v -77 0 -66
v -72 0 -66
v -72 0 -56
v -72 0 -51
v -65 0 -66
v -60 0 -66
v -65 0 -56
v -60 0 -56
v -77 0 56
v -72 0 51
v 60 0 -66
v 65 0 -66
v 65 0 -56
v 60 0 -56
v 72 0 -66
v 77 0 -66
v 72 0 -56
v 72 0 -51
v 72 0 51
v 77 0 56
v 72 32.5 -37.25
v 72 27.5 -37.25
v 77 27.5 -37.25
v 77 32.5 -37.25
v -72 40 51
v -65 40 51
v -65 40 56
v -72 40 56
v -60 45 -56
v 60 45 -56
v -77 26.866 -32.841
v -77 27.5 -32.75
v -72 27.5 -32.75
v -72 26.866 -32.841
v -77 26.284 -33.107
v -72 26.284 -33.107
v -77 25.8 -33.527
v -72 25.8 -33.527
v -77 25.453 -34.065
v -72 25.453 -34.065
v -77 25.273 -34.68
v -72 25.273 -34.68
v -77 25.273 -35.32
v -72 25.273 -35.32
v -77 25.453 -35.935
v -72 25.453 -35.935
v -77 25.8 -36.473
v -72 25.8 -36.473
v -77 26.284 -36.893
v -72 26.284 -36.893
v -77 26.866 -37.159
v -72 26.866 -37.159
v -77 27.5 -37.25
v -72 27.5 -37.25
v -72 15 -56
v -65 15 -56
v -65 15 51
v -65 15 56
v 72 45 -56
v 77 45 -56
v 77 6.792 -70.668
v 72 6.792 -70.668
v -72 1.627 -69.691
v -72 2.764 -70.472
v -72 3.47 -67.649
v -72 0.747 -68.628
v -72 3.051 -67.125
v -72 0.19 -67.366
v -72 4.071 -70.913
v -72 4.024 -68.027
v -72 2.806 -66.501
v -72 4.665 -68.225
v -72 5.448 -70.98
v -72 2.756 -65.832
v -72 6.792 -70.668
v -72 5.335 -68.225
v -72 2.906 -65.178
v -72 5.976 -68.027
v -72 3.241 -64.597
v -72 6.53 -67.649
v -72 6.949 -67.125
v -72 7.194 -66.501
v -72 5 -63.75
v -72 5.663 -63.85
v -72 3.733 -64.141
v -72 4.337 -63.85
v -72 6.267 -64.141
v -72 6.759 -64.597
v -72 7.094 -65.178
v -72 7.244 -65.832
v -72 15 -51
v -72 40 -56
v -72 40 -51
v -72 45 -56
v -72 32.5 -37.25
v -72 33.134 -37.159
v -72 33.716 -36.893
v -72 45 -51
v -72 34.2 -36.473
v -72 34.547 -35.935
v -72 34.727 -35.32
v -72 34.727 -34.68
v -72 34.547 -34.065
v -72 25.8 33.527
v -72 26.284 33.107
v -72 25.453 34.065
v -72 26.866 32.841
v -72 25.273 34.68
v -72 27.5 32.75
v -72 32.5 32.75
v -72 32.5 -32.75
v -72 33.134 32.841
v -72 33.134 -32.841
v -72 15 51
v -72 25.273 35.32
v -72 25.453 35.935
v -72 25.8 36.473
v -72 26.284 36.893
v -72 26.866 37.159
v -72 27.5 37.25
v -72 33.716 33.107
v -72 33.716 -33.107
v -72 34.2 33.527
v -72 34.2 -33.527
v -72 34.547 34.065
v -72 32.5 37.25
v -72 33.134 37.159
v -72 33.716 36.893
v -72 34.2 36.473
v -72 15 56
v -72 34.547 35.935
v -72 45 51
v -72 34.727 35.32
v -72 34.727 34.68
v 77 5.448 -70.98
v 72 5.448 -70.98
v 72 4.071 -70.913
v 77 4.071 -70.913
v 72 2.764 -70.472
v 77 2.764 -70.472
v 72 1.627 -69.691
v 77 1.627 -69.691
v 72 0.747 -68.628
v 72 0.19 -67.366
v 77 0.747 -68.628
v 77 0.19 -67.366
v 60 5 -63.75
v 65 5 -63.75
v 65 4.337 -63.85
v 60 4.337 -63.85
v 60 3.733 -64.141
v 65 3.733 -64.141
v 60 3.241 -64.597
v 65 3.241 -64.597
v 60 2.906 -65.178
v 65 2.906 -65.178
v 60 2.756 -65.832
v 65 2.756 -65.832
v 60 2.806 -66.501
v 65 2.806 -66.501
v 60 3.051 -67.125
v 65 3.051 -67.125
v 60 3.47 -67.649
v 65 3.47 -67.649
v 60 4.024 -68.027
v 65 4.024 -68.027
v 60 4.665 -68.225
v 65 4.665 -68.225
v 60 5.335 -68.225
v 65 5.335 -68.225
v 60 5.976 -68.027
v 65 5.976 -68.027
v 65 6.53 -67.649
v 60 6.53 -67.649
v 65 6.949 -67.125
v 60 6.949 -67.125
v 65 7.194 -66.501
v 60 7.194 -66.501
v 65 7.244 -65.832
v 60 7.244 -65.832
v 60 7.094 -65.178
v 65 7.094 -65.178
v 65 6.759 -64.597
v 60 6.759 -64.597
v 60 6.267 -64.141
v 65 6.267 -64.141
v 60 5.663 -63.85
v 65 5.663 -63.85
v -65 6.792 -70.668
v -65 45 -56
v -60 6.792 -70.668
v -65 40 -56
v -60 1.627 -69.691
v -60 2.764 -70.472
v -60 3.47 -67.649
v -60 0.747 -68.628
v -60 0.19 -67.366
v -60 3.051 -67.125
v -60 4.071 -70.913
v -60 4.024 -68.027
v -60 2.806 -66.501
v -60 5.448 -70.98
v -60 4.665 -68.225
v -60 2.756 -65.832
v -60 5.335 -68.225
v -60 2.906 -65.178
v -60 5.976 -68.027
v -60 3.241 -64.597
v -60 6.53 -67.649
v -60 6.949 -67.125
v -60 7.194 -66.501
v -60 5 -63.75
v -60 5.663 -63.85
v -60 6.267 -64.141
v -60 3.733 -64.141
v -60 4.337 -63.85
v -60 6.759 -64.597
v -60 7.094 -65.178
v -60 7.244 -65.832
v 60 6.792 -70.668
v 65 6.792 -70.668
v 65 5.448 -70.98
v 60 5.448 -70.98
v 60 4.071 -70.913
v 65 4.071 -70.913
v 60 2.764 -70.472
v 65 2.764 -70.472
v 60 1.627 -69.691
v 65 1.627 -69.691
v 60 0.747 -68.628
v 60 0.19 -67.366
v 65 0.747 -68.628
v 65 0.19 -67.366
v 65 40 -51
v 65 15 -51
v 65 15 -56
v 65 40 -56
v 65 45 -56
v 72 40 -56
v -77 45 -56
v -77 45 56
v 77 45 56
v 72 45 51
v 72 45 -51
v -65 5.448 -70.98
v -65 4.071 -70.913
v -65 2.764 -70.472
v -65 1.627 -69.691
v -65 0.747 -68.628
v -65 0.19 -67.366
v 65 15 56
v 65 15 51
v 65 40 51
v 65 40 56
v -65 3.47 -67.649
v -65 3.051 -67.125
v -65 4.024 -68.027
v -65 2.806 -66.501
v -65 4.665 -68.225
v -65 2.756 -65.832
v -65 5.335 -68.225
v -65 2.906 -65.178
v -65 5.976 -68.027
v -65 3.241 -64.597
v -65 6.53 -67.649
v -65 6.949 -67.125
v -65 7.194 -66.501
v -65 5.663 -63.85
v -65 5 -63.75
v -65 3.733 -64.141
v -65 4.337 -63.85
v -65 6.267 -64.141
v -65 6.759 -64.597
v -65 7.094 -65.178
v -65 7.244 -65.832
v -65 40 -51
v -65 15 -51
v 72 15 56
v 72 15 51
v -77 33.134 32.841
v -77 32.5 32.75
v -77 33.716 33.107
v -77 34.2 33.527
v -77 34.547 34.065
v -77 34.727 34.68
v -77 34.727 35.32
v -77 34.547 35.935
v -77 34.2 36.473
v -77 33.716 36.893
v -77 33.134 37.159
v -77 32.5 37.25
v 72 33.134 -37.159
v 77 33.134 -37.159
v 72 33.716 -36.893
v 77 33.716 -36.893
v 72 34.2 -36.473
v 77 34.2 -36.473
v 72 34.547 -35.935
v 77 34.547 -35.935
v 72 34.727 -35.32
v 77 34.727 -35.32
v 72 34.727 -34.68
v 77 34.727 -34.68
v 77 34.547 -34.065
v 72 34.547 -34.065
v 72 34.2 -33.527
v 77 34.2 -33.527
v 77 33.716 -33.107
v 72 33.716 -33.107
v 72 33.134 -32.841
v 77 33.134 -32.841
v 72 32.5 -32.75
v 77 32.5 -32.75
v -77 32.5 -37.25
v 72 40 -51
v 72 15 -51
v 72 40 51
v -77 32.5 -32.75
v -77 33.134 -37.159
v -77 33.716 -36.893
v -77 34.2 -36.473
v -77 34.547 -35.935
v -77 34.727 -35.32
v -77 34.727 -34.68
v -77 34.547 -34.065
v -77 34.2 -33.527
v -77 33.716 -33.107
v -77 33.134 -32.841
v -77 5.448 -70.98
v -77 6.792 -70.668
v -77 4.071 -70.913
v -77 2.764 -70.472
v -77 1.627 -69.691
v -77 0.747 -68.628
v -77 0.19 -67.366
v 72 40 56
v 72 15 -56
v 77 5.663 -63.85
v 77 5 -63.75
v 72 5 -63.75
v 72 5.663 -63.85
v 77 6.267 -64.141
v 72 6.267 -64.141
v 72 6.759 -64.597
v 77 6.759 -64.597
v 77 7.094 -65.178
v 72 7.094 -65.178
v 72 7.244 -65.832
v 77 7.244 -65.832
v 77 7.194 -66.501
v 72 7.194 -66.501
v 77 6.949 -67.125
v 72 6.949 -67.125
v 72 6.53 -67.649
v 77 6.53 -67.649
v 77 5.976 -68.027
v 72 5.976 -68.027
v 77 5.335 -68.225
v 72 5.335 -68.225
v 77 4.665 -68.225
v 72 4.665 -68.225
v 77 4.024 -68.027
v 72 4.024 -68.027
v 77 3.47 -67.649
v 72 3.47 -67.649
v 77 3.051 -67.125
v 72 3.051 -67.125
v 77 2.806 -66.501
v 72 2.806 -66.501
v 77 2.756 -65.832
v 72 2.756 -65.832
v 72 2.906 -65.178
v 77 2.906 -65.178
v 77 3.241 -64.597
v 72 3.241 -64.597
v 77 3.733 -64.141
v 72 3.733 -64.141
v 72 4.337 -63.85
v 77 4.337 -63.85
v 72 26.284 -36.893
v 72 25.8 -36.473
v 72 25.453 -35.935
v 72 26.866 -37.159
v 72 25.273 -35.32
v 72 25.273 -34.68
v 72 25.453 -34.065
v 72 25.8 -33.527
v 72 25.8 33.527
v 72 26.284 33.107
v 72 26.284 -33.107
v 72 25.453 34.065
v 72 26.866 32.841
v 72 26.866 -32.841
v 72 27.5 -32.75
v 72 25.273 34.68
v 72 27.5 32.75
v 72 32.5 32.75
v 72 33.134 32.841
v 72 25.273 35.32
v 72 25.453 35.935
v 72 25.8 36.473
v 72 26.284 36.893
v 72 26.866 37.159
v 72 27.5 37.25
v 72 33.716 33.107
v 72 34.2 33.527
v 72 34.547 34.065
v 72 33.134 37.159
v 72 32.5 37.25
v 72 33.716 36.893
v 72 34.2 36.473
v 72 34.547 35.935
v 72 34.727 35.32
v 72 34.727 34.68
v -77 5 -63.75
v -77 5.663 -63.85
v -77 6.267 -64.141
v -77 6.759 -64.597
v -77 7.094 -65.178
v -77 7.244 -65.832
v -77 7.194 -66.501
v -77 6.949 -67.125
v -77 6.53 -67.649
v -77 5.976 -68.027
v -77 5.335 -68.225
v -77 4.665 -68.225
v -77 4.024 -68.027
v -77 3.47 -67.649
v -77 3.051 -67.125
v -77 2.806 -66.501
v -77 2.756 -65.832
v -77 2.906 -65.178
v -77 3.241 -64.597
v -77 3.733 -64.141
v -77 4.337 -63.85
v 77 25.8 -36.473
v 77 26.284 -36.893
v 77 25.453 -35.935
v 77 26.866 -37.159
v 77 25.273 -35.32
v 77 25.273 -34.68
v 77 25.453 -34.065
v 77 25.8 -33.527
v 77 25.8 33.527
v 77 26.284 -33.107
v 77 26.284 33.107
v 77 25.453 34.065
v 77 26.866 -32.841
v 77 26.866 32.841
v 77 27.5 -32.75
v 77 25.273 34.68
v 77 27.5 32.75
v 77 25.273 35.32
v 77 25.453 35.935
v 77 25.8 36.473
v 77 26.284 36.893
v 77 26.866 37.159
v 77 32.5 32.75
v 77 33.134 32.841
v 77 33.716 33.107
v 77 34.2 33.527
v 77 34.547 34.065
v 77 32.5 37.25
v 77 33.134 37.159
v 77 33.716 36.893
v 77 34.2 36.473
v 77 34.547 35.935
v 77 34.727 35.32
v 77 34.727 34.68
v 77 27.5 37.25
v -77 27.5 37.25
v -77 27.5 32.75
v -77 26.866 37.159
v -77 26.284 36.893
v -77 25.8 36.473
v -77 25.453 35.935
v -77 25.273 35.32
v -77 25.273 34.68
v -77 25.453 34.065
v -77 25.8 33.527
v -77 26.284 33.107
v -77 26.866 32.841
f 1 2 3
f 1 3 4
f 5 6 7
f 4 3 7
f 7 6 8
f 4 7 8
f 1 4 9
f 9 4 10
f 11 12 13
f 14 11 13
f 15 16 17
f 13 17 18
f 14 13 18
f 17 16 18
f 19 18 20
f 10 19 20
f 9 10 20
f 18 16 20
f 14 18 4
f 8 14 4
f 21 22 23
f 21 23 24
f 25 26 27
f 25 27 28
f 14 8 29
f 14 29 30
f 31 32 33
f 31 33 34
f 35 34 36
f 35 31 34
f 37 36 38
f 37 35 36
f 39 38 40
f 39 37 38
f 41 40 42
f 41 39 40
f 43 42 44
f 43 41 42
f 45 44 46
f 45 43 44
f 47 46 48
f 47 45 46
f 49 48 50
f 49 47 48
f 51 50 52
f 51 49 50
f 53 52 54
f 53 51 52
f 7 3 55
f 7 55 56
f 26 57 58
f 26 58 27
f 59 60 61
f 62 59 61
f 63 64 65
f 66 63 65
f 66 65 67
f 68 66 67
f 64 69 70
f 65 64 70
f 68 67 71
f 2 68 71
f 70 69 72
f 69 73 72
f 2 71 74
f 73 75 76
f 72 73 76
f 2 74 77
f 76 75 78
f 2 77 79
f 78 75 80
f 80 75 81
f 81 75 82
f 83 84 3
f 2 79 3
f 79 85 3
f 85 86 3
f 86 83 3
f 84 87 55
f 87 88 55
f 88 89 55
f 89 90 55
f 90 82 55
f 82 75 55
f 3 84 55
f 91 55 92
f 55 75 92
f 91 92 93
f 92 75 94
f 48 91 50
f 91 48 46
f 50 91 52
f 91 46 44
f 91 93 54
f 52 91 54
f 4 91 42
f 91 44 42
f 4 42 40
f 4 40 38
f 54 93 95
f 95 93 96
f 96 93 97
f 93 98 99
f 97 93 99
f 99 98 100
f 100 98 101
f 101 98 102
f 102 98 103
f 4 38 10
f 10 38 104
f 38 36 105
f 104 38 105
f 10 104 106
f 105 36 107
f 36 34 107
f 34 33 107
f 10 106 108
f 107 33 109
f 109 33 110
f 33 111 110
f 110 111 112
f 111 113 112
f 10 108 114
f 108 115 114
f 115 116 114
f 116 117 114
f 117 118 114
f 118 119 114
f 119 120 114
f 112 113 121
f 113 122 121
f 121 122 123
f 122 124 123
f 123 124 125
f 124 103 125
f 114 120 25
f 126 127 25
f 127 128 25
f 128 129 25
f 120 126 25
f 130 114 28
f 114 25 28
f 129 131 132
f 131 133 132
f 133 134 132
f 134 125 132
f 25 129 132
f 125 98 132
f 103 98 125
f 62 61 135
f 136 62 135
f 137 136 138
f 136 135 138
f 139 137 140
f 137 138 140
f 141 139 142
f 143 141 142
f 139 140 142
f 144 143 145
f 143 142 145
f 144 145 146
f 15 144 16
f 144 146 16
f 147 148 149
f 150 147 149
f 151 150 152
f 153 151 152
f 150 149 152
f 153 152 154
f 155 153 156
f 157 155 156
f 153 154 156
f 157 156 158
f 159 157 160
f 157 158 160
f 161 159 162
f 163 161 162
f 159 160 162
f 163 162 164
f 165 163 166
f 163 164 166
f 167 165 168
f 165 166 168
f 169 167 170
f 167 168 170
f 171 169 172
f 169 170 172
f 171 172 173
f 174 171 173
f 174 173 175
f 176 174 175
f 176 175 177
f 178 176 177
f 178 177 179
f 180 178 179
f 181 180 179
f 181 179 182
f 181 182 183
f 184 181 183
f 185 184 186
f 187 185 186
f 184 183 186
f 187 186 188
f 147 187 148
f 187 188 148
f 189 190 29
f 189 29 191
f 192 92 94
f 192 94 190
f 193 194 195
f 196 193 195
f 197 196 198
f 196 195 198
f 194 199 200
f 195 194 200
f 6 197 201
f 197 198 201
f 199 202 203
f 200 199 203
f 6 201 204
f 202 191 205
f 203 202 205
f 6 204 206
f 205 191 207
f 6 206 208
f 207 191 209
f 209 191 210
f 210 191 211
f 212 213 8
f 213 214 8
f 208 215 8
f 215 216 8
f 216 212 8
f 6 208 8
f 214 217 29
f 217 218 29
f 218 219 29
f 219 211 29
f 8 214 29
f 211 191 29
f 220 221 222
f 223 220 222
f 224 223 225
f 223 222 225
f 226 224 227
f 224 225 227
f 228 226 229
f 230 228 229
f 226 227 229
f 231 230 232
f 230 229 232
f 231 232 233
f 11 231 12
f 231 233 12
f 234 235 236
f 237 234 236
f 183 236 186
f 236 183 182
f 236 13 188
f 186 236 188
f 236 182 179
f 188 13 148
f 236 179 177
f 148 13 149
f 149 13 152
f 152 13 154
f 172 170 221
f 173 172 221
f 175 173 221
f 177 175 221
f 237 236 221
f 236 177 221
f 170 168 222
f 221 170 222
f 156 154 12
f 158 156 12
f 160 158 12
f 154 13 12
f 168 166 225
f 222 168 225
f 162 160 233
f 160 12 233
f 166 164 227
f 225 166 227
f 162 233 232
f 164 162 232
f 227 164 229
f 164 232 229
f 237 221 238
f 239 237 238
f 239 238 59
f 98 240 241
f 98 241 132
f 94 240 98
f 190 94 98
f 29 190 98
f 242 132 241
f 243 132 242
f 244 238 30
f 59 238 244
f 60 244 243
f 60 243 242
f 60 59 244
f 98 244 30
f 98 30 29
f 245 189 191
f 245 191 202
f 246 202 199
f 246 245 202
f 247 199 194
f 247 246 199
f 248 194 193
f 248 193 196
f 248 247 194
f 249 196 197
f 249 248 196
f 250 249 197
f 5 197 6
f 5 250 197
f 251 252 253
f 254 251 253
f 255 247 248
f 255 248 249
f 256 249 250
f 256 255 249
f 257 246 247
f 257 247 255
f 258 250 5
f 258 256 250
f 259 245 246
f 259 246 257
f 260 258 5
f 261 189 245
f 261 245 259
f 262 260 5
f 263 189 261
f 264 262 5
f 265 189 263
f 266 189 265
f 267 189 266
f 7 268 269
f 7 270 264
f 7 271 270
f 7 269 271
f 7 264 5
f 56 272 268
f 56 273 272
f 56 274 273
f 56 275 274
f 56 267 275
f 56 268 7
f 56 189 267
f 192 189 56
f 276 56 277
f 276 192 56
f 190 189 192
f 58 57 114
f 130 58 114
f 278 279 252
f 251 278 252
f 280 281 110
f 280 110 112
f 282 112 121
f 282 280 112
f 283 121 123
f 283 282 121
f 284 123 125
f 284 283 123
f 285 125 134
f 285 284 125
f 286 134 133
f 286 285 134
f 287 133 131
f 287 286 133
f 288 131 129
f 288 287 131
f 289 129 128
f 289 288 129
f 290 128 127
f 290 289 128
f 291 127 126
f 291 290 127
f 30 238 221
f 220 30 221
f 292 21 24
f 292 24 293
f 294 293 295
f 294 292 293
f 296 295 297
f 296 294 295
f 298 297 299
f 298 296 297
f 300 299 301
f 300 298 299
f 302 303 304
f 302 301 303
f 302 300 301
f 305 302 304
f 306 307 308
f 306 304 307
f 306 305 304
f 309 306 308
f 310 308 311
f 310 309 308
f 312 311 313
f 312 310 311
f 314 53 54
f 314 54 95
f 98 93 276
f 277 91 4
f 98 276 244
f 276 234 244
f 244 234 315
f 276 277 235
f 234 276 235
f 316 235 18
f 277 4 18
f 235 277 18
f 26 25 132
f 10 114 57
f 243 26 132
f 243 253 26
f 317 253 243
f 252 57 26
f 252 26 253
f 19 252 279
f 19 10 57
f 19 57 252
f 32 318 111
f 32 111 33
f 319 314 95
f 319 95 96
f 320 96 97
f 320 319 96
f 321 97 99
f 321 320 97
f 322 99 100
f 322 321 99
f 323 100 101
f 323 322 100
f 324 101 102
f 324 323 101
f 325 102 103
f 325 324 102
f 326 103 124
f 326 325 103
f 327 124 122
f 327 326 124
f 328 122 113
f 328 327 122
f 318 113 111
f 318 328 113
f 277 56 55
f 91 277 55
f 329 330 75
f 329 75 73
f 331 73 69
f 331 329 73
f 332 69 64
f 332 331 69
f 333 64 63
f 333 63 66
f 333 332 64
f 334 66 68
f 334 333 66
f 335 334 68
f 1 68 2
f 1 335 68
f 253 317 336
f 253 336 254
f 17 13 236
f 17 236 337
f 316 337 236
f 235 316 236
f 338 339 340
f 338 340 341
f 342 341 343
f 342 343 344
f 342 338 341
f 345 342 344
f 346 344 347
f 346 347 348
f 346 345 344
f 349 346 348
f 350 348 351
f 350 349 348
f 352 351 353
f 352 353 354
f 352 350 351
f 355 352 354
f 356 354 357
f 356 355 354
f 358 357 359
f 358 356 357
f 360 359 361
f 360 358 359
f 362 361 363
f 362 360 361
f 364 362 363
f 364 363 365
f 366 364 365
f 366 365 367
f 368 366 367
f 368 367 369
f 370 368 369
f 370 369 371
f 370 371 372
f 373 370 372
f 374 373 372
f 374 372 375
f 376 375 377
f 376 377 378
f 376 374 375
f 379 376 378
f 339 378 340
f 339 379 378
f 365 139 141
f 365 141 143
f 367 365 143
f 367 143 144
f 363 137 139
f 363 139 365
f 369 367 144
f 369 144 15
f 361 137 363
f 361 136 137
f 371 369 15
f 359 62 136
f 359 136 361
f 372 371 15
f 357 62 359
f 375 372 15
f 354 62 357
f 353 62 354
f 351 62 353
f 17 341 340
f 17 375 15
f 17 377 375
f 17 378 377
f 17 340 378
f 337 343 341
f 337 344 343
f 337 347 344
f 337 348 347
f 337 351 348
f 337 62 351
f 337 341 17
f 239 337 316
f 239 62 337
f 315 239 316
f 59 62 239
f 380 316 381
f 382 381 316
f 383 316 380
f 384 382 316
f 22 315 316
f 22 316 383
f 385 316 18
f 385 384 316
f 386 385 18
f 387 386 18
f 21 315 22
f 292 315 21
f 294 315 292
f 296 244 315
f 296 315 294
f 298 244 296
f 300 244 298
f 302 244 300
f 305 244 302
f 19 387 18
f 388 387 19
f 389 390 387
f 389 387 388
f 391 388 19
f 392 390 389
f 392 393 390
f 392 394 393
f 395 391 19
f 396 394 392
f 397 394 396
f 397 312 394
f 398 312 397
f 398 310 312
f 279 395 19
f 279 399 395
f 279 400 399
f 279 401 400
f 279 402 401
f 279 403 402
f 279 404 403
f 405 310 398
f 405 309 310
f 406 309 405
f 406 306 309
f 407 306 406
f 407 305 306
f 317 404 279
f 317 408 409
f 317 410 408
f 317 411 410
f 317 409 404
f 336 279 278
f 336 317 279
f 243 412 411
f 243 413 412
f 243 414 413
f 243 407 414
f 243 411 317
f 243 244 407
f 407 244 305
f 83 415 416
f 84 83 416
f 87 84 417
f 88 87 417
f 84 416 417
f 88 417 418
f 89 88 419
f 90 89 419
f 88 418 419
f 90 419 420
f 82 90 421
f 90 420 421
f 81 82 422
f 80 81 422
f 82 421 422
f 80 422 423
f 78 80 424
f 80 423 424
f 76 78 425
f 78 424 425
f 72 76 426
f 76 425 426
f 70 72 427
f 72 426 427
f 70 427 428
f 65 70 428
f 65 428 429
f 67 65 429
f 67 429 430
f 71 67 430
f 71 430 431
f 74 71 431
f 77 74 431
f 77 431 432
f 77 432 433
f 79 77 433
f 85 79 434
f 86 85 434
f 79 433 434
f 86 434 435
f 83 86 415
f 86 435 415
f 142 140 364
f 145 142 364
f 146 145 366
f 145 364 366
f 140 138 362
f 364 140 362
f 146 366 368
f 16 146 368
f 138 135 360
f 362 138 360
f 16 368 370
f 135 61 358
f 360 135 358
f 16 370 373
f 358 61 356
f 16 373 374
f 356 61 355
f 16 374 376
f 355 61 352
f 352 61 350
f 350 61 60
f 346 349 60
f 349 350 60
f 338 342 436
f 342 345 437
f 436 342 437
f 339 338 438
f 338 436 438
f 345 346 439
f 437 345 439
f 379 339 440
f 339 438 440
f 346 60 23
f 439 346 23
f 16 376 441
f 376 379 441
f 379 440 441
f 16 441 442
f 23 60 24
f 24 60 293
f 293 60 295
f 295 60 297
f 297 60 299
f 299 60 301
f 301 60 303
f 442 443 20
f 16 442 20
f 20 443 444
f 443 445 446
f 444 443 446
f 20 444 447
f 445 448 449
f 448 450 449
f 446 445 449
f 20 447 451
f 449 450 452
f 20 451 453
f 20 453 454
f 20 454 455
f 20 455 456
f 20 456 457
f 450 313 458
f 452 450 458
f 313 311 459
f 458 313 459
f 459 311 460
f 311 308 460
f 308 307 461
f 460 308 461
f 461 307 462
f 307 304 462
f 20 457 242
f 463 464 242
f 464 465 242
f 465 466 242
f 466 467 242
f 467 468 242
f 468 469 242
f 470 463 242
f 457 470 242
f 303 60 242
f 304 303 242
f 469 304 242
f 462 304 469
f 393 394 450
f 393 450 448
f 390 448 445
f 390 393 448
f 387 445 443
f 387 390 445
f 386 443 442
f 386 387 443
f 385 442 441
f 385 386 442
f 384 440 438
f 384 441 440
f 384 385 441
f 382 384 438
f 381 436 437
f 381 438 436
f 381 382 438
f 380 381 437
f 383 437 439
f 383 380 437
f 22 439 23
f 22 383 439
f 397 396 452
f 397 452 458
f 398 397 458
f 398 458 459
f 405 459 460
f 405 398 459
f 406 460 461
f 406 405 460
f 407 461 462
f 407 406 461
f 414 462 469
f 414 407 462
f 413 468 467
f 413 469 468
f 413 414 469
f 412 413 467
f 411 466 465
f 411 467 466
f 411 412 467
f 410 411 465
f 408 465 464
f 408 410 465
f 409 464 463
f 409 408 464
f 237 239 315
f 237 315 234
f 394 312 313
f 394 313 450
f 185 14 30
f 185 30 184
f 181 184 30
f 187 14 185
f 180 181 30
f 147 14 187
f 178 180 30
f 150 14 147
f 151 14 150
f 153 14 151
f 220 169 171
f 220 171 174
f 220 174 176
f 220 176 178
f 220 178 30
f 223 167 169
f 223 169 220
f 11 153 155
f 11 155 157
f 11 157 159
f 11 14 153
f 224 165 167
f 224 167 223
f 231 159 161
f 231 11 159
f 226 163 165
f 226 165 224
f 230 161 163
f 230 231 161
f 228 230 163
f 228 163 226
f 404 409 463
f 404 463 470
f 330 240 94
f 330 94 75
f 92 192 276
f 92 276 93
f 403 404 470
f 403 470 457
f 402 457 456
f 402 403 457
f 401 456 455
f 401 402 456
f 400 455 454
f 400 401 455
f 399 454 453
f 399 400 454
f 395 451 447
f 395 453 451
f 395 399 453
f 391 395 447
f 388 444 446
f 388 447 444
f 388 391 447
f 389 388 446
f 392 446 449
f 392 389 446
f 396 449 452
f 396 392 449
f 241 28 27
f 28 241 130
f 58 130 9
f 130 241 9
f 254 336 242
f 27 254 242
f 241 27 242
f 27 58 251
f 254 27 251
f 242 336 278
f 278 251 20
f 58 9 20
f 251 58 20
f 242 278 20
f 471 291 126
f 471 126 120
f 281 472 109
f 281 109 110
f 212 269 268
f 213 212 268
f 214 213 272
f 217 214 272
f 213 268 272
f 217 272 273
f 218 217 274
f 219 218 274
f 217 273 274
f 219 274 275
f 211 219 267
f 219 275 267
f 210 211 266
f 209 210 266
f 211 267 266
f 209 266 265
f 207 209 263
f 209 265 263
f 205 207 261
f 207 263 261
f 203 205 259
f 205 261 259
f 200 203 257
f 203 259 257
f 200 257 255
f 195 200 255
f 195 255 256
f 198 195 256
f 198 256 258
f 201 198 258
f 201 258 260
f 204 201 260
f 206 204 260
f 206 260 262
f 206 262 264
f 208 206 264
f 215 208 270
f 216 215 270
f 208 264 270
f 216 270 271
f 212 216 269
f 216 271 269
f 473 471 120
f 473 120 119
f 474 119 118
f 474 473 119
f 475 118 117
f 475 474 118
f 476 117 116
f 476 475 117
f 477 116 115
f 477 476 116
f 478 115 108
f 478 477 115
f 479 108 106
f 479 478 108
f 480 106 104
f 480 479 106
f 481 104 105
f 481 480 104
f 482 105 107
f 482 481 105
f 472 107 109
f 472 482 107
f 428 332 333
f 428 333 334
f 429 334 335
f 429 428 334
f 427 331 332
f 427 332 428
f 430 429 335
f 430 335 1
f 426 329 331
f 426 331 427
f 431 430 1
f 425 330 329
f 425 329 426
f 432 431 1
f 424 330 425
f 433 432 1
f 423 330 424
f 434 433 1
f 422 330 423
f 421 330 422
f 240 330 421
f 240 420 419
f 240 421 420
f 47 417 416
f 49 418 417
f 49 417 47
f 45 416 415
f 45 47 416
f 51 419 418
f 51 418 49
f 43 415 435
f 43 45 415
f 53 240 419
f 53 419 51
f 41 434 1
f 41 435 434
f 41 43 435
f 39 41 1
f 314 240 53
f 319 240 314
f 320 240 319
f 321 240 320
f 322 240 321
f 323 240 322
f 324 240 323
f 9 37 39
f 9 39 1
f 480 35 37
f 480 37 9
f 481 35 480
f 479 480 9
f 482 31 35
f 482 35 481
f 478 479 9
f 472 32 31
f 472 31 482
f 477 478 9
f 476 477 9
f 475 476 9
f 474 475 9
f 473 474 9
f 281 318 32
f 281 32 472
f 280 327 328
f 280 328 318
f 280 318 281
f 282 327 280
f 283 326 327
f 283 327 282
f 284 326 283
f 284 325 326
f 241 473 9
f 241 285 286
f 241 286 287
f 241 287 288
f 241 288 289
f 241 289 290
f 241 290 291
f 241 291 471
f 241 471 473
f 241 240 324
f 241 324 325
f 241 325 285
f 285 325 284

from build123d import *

# Parameters (mm, degrees)
SKETCH1_W               = 154
SKETCH1_H               = 112
SKETCH1_W_2             = 144
SKETCH1_H_2             = 102
BOSS_EXTRUDE1_DEPTH     = 45
CUT_EXTRUDE1_DEPTH      = 180.5
SKETCH3_W               = 7
SKETCH3_H               = 25
CUT_EXTRUDE3_DEPTH      = 134
SKETCH4_R               = 2.25
BOSS_EXTRUDE2_DEPTH     = 5
LPATTERN1_COUNT         = 2
LPATTERN1_PITCH         = 12
MIRROR1_COPY_1_SKETCH_R = 2.25
MIRROR1_COPY_1_DEPTH    = 5


with BuildPart() as part:
    # Sketch1 → Boss-Extrude1 (new body)
    with BuildSketch(Plane(origin=(0, 0, 0), x_dir=(1, 0, 0), z_dir=(0, 1, 0))):
        Rectangle(SKETCH1_W, SKETCH1_H)
        Rectangle(SKETCH1_W_2, SKETCH1_H_2, mode=Mode.SUBTRACT)
    extrude(amount=BOSS_EXTRUDE1_DEPTH)

    # Sketch2 → Cut-Extrude1 (cut)
    with BuildSketch(Plane.ZY.offset(77)):
        with BuildLine():
            Line((-32.75, 32.5), (-32.75, 27.5))
            ThreePointArc((-32.75, 27.5), (-35, 25.25), (-37.25, 27.5))
            Line((-37.25, 27.5), (-37.25, 32.5))
            ThreePointArc((-37.25, 32.5), (-35, 34.75), (-32.75, 32.5))
        make_face()
        with BuildLine():
            Line((37.25, 32.5), (37.25, 27.5))
            ThreePointArc((37.25, 27.5), (35, 25.25), (32.75, 27.5))
            Line((32.75, 27.5), (32.75, 32.5))
            ThreePointArc((32.75, 32.5), (35, 34.75), (37.25, 32.5))
        make_face()
    extrude(amount=-CUT_EXTRUDE1_DEPTH, mode=Mode.SUBTRACT)

    # Sketch3 → Cut-Extrude3 (cut)
    with BuildSketch(Plane(origin=(0, 0, -56), x_dir=(-1, 0, 0), z_dir=(0, 0, -1))):
        with Locations((-68.5, 27.5)):
            Rectangle(SKETCH3_W, SKETCH3_H)
        with Locations((68.5, 27.5)):
            Rectangle(SKETCH3_W, SKETCH3_H)
    extrude(amount=-CUT_EXTRUDE3_DEPTH, mode=Mode.SUBTRACT)

    # Sketch4 → Boss-Extrude2 (add)
    with BuildSketch(Plane.ZY.offset(77)):
        with BuildLine():
            Line((-66, 0), (-56, 0))
            Line((-56, 0), (-56, 45))
            Line((-56, 45), (-70.667854572, 6.791963643))
            ThreePointArc((-70.667854572, 6.791963643), (-70.120668527, 2.168023501), (-66, 0))
        make_face()
        with Locations((-66, 5)):
            Circle(SKETCH4_R, mode=Mode.SUBTRACT)
    boss_extrude2 = extrude(amount=-BOSS_EXTRUDE2_DEPTH)

    # LPattern1: Boss-Extrude2 ×2
    with Locations(*[(i * LPATTERN1_PITCH, 0, 0) for i in range(1, LPATTERN1_COUNT)]):
        add(boss_extrude2)

    # Mirror1: Boss-Extrude2 across plane
    add(boss_extrude2.mirror(Plane(origin=(0, 0, 0), x_dir=(0, 0, 1), z_dir=(1, 0, 0))))

    # Mirror1 copy 1 sketch → Mirror1 copy 1 (add)
    with BuildSketch(Plane(origin=(65, 0, 0), x_dir=(0, 0, 1), z_dir=(1, 0, 0))):
        with BuildLine():
            Line((-66, 0), (-56, 0))
            Line((-56, 0), (-56, -45))
            Line((-56, -45), (-70.667854572, -6.791963643))
            ThreePointArc((-70.667854572, -6.791963643), (-70.120668527, -2.168023501), (-66, 0))
        make_face()
        with Locations((-66, -5)):
            Circle(MIRROR1_COPY_1_SKETCH_R, mode=Mode.SUBTRACT)
    extrude(amount=-MIRROR1_COPY_1_DEPTH)


solid = part.part
